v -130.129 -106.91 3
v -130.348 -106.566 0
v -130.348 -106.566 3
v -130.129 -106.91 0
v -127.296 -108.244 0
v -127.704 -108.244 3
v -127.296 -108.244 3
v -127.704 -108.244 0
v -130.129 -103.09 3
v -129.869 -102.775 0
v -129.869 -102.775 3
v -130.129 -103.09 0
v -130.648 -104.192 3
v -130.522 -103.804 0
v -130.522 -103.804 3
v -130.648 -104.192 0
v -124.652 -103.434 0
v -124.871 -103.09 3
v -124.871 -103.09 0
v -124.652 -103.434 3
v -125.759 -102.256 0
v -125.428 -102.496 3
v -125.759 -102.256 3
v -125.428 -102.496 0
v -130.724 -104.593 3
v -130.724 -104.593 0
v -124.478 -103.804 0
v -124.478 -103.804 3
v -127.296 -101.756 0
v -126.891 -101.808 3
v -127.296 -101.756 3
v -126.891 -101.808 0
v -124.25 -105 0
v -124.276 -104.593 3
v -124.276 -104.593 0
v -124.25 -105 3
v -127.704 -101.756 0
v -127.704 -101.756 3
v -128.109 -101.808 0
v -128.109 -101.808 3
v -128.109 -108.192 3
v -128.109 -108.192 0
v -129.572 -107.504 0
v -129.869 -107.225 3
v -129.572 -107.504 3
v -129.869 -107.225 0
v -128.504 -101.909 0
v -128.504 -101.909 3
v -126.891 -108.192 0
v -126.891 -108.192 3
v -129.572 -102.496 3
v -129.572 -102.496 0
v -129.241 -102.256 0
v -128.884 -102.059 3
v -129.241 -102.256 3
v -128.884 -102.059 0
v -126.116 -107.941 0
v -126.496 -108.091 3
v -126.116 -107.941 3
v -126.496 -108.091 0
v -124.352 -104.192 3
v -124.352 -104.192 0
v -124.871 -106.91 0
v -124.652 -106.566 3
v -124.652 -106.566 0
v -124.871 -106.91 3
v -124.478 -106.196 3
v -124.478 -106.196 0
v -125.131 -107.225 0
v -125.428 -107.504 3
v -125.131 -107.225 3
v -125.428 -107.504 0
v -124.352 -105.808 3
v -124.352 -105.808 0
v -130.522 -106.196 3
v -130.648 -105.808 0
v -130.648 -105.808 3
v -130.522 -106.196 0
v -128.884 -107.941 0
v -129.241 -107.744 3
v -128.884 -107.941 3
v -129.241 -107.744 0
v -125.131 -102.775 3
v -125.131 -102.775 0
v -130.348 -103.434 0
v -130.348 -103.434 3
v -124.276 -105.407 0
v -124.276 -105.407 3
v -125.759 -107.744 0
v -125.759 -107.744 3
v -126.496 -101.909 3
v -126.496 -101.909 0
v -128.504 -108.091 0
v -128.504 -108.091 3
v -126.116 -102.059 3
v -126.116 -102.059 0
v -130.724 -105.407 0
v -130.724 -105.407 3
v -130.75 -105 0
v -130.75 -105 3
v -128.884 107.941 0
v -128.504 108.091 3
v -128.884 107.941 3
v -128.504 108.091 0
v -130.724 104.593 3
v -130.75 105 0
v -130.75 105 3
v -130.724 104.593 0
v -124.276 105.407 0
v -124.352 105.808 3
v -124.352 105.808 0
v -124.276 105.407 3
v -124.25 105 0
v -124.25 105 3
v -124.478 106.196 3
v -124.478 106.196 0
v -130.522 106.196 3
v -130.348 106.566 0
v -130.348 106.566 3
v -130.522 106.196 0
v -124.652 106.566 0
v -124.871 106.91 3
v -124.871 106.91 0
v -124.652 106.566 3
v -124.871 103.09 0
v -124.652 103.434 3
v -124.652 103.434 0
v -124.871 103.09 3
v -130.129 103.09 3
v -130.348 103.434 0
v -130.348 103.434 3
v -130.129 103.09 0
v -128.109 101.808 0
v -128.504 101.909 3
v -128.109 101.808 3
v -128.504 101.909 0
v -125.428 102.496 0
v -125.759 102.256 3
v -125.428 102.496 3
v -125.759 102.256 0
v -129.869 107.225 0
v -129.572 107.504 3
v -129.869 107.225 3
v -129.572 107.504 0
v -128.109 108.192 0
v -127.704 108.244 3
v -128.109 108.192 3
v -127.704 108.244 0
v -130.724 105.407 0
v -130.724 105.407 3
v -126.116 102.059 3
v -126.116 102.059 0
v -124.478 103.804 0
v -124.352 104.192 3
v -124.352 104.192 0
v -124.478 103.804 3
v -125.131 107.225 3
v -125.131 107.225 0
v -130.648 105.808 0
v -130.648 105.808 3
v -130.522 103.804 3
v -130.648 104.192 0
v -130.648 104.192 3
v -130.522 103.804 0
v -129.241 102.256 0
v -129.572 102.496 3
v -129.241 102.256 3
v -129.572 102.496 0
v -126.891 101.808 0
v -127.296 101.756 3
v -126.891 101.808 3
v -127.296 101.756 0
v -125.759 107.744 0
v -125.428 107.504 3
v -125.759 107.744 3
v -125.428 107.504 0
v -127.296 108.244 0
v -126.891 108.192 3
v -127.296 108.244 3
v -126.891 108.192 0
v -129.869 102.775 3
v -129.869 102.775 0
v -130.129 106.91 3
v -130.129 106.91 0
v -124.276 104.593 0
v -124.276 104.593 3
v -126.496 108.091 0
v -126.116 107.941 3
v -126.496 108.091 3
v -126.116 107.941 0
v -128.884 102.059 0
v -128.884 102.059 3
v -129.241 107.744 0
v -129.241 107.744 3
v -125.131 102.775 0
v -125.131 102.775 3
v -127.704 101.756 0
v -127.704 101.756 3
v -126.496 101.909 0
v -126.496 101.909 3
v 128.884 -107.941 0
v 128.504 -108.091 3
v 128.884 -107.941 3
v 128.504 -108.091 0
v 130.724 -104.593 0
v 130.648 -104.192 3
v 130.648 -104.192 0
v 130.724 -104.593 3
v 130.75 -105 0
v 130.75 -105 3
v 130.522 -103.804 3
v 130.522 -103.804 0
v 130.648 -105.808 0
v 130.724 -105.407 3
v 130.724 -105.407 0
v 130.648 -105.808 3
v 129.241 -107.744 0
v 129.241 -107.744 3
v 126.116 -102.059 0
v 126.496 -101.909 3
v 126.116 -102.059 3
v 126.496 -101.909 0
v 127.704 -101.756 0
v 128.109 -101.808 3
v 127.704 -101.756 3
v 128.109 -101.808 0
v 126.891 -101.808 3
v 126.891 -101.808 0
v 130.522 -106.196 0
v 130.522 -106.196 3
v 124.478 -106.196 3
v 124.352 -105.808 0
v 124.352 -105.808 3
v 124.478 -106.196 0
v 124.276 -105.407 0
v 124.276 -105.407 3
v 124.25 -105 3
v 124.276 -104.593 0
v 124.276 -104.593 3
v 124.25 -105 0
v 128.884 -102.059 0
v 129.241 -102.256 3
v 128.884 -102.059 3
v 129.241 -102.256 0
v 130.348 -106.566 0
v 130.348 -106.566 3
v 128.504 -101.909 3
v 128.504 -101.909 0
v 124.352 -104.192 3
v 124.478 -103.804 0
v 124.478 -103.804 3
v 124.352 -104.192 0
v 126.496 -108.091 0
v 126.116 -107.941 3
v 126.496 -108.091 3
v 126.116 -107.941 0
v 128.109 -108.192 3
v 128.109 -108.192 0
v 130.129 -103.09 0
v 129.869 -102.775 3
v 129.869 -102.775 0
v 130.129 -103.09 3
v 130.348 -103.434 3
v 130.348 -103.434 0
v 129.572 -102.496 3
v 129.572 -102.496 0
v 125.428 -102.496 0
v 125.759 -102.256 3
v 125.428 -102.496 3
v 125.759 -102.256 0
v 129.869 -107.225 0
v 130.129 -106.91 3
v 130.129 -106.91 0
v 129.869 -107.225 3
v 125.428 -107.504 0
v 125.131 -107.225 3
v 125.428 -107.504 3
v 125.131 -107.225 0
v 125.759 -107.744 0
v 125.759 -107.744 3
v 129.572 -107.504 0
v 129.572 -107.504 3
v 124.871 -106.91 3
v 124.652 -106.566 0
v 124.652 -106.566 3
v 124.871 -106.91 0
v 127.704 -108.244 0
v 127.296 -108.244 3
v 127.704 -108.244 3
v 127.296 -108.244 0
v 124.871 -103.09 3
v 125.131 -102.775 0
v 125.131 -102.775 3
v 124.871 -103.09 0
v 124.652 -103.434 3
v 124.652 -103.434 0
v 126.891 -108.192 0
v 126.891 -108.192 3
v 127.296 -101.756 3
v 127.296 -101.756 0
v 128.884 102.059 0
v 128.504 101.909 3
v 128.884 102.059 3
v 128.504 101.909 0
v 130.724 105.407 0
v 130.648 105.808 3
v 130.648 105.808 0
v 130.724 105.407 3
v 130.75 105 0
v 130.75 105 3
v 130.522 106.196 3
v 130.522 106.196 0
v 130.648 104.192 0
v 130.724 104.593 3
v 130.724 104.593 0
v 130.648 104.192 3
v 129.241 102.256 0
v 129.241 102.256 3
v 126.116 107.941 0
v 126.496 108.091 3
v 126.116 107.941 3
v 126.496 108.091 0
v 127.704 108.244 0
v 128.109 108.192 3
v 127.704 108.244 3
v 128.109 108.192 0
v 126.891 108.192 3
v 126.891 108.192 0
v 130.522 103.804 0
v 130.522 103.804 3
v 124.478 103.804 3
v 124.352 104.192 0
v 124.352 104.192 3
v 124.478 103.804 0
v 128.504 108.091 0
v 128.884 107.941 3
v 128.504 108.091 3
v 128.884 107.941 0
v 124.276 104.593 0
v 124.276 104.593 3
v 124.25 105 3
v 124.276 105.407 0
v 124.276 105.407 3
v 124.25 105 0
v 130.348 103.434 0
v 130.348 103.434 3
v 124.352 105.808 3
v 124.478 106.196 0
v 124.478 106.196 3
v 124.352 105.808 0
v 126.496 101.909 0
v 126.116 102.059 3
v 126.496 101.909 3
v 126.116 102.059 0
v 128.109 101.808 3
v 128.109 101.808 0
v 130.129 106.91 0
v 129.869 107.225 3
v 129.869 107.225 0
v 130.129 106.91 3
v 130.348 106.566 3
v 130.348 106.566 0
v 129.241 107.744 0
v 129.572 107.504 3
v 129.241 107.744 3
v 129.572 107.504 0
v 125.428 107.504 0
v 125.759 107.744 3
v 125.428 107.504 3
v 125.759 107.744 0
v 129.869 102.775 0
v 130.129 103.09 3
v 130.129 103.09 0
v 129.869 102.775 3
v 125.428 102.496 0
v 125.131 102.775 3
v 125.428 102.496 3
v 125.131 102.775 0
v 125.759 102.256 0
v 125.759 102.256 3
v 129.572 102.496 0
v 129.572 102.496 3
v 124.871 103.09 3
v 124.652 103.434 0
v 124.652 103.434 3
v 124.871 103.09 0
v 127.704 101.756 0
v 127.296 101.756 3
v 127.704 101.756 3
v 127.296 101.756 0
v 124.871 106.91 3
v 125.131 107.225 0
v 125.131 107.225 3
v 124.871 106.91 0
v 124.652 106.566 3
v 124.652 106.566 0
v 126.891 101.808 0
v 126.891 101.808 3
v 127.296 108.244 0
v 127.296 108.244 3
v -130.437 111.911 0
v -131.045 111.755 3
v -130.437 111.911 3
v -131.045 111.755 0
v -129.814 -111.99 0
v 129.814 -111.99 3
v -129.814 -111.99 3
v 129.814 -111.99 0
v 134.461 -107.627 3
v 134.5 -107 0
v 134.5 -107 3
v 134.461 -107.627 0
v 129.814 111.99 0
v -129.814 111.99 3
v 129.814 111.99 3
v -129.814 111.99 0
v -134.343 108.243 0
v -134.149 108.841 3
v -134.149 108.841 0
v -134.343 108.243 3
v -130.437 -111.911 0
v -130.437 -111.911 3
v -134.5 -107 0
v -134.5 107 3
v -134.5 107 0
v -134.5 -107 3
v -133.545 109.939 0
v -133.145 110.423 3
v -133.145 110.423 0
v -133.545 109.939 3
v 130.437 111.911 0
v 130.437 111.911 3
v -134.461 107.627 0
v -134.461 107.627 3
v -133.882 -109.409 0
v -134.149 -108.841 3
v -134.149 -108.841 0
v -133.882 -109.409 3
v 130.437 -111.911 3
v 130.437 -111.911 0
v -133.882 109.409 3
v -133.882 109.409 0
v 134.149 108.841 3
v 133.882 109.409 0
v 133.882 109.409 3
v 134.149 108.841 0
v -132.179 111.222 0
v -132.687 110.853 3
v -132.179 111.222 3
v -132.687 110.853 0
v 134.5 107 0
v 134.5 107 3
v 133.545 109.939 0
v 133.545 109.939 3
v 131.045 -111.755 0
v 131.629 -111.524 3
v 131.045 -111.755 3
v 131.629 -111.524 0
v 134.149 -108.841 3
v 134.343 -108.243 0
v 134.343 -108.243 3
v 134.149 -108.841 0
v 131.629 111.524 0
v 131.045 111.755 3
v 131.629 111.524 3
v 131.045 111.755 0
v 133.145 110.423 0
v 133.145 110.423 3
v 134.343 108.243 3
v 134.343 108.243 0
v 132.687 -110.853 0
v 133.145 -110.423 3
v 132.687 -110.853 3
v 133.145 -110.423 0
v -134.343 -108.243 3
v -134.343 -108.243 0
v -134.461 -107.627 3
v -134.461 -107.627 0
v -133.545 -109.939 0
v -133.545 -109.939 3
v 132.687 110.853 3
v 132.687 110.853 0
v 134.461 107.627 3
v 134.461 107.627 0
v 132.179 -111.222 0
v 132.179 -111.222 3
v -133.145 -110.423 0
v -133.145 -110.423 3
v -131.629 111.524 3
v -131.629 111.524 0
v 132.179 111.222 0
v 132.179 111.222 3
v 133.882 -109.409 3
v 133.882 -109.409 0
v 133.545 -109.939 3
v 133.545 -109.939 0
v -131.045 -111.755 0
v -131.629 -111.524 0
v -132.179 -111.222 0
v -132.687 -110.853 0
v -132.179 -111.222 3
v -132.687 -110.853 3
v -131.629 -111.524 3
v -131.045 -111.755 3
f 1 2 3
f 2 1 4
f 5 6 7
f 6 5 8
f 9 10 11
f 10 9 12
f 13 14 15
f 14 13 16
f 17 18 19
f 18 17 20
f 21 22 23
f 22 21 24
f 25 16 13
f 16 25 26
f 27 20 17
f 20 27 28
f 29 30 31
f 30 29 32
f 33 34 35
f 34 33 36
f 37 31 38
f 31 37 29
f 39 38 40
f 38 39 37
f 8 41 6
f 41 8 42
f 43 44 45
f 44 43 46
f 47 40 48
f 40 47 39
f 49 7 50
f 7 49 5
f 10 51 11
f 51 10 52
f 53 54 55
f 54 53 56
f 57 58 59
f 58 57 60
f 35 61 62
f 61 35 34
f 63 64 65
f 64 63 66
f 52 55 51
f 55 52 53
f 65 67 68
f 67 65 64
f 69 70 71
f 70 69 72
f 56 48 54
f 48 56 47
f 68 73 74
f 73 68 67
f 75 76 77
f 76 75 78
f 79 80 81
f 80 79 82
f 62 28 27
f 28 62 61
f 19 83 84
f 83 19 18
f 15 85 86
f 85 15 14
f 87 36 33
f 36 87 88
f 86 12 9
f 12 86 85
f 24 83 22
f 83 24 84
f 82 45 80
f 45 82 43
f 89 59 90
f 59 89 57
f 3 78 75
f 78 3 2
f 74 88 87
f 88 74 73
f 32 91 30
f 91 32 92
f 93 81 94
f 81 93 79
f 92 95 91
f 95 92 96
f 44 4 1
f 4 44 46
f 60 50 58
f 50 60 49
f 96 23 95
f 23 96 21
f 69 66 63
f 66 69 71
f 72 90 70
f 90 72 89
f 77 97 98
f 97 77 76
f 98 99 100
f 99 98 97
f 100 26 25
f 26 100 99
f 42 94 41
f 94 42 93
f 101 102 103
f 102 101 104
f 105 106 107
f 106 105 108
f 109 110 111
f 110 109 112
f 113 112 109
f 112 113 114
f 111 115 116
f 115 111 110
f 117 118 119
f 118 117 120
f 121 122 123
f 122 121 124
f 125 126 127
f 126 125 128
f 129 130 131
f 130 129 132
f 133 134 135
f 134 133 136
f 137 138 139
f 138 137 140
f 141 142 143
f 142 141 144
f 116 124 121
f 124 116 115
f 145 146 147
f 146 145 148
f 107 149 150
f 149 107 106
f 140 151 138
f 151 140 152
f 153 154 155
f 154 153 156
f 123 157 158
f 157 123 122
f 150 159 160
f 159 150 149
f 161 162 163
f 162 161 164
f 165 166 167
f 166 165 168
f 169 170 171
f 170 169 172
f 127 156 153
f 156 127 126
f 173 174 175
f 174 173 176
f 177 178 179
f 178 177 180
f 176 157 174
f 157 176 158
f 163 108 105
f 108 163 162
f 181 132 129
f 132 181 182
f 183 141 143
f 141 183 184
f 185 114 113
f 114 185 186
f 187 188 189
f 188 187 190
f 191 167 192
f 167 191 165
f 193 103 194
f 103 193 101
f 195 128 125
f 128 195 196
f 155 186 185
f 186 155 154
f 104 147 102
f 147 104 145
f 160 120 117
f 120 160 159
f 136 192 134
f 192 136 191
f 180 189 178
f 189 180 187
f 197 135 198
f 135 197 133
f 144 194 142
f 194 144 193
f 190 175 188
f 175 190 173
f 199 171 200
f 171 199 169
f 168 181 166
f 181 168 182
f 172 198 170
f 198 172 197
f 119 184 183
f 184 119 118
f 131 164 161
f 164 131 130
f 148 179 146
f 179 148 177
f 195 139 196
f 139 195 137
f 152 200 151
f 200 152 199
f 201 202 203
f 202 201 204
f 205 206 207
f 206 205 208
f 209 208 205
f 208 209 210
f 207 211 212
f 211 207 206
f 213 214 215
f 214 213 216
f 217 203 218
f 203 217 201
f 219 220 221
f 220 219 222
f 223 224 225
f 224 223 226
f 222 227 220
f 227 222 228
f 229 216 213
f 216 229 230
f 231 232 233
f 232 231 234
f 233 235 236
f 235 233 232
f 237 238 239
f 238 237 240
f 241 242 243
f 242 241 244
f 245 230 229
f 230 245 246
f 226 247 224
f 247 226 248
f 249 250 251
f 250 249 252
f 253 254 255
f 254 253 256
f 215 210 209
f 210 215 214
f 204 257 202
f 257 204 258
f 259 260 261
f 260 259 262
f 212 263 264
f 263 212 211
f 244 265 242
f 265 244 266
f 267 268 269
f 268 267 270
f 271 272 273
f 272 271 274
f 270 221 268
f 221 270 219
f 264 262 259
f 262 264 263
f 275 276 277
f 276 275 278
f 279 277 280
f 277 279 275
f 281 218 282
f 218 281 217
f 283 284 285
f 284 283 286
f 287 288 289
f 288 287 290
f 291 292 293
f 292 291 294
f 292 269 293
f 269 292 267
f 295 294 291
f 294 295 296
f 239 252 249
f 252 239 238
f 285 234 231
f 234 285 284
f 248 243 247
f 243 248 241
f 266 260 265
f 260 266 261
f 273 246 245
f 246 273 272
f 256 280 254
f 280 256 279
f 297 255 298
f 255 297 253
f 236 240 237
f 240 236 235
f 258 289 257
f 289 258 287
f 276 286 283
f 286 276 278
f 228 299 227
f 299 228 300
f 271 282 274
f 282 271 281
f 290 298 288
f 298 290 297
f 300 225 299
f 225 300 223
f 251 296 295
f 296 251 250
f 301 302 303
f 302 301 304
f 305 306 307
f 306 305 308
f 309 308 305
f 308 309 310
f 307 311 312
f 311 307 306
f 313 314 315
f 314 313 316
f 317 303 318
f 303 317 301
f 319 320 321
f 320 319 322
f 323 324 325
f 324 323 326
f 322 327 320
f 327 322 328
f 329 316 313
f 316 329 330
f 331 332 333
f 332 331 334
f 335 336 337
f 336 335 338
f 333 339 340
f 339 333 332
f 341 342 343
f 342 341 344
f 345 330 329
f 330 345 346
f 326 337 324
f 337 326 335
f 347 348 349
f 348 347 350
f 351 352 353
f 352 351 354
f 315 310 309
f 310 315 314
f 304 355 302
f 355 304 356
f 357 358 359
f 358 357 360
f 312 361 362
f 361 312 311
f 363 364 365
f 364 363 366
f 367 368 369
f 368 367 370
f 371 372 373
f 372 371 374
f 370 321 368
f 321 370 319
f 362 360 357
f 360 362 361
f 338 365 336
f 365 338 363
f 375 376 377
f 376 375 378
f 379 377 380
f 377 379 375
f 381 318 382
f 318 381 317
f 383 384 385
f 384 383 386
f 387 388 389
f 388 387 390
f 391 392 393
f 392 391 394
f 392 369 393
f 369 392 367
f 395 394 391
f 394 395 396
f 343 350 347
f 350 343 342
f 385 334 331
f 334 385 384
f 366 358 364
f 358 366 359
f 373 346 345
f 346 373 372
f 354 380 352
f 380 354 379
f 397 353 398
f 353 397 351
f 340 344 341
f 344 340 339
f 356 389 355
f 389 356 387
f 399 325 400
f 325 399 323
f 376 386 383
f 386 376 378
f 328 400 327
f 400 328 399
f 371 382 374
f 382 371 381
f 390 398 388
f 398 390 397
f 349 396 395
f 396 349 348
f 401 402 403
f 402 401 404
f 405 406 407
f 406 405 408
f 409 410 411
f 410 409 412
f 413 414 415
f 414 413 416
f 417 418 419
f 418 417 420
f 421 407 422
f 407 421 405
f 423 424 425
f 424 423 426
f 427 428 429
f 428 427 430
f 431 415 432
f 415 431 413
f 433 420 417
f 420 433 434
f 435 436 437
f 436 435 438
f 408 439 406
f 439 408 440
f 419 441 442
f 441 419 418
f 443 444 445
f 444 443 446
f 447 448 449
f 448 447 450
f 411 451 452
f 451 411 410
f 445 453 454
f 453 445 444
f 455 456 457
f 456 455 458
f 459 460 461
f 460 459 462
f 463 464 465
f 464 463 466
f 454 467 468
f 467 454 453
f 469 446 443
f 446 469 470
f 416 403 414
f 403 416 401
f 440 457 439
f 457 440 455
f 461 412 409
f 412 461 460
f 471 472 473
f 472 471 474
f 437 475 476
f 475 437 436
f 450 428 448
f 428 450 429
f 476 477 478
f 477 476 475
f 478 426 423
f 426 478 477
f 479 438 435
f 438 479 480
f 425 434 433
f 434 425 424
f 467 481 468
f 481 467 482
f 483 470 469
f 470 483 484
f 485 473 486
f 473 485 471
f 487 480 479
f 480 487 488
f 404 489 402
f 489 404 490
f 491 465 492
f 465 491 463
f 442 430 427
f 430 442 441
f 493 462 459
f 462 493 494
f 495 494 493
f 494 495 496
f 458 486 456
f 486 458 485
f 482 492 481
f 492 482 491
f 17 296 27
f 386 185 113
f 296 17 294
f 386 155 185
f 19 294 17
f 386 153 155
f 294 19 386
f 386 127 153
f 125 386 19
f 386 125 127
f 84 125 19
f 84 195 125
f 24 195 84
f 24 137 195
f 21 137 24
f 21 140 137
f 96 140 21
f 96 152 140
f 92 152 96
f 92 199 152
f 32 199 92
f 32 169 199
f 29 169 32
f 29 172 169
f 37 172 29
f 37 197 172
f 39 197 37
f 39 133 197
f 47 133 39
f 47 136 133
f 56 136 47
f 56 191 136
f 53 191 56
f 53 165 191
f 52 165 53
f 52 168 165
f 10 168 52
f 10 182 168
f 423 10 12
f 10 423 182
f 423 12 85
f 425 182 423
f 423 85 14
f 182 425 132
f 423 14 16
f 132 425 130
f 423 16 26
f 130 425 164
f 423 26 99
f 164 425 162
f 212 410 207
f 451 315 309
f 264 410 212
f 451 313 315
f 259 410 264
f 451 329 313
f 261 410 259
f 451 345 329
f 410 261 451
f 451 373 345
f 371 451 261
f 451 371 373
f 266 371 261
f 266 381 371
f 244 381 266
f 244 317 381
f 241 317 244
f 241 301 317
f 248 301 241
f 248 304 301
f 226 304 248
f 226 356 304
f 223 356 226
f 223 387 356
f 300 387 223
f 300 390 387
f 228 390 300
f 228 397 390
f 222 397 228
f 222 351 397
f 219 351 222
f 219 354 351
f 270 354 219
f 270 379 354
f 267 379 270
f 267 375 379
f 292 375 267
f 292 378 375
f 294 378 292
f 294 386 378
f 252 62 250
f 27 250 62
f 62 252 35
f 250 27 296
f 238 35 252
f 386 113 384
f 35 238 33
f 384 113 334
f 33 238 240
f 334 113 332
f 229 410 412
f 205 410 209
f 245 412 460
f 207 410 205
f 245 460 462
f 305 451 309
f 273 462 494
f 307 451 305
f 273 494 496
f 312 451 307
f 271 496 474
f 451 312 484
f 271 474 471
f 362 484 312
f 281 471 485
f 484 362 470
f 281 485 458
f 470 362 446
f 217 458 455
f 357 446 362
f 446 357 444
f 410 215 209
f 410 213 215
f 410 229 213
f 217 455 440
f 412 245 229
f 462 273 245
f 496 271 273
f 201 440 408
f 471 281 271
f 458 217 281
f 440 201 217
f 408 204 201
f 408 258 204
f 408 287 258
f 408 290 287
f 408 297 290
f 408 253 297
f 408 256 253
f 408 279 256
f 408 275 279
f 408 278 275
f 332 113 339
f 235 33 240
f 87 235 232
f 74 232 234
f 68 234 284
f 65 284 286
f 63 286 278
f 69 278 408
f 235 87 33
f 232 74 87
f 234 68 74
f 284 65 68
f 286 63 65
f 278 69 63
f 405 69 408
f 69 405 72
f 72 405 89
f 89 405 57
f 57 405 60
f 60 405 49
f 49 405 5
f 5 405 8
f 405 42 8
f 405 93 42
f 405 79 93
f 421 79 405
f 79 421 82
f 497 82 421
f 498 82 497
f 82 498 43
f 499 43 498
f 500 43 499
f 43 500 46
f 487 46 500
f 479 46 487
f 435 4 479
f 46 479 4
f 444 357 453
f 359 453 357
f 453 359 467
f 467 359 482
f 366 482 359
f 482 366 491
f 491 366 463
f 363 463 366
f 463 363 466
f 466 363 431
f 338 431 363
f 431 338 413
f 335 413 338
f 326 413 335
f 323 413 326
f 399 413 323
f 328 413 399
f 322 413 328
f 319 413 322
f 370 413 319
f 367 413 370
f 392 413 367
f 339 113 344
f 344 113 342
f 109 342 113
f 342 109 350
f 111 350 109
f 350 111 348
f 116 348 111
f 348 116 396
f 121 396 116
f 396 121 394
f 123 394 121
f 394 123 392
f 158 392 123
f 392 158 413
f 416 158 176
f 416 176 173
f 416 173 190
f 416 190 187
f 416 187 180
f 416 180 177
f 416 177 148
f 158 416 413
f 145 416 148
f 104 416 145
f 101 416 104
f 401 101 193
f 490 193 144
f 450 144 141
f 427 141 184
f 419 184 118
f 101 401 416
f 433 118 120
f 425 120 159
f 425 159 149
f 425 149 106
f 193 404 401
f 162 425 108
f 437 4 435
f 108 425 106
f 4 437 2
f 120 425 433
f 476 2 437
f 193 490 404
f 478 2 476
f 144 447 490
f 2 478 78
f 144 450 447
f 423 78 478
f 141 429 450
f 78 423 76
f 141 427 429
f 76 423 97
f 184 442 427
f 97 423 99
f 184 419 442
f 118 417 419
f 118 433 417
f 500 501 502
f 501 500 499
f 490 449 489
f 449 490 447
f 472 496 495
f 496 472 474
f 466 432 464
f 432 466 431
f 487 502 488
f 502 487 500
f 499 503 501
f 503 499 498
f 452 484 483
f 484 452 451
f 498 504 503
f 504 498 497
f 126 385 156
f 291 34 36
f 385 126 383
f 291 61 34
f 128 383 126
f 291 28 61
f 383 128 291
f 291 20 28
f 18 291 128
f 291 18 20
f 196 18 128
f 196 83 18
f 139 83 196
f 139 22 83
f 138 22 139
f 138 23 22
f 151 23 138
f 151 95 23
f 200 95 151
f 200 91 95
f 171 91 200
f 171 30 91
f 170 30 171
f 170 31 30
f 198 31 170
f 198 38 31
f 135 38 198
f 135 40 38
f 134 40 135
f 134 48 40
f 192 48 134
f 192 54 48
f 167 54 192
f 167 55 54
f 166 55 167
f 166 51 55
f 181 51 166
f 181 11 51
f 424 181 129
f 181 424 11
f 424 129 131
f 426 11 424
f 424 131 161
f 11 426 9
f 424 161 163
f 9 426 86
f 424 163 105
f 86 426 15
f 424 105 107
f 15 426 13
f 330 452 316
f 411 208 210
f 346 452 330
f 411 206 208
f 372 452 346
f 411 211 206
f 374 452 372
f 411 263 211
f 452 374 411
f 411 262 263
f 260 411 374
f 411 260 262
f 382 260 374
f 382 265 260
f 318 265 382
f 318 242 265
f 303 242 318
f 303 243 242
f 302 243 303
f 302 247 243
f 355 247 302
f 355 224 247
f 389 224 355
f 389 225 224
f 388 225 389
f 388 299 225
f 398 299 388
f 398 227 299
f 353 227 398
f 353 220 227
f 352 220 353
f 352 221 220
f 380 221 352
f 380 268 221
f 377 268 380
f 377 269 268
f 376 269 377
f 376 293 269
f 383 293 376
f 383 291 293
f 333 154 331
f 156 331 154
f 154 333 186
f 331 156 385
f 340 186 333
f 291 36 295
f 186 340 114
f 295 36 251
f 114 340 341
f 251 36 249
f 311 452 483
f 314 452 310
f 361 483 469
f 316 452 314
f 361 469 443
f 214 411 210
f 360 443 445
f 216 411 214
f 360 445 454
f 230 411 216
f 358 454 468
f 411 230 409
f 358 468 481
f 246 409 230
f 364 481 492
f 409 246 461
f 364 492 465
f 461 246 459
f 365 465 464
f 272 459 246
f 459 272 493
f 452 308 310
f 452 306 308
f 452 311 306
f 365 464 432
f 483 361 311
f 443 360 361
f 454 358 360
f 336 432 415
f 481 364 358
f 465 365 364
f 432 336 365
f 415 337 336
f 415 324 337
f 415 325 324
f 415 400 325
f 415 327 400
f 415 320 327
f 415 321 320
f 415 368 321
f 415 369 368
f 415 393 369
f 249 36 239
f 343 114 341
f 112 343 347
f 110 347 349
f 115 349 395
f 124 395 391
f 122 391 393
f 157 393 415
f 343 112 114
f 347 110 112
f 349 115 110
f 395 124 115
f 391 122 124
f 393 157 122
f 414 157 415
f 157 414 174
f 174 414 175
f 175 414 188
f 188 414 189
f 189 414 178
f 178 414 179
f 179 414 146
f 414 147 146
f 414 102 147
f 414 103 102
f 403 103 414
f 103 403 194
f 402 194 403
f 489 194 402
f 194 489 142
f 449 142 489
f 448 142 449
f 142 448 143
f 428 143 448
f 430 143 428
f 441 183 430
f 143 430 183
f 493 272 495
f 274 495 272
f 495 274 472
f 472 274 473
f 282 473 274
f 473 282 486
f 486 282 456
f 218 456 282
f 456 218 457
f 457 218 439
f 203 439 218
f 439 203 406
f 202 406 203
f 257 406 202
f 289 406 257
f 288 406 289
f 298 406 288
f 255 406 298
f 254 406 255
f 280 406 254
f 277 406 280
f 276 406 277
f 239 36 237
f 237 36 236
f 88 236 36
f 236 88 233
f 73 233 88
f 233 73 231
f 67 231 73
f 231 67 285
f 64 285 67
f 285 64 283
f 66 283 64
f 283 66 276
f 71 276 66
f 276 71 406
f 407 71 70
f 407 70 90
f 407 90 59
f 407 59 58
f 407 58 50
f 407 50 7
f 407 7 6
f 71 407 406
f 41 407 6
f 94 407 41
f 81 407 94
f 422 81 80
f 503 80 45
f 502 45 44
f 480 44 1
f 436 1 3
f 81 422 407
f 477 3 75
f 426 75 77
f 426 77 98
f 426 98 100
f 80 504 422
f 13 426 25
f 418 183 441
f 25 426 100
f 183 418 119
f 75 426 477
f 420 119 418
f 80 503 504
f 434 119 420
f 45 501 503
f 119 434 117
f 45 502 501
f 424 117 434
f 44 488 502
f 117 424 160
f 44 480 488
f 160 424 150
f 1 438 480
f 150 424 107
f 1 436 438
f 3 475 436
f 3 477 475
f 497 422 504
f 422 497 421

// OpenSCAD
$fn = 50;


difference() {
	union() {
		hull() {
			translate(v = [-129.5000000000, 107.0000000000, 0]) {
				cylinder(h = 3, r = 5);
			}
			translate(v = [129.5000000000, 107.0000000000, 0]) {
				cylinder(h = 3, r = 5);
			}
			translate(v = [-129.5000000000, -107.0000000000, 0]) {
				cylinder(h = 3, r = 5);
			}
			translate(v = [129.5000000000, -107.0000000000, 0]) {
				cylinder(h = 3, r = 5);
			}
		}
	}
	union() {
		translate(v = [-127.5000000000, -105.0000000000, -100.0000000000]) {
			cylinder(h = 200, r = 3.2500000000);
		}
		translate(v = [-127.5000000000, 105.0000000000, -100.0000000000]) {
			cylinder(h = 200, r = 3.2500000000);
		}
		translate(v = [127.5000000000, -105.0000000000, -100.0000000000]) {
			cylinder(h = 200, r = 3.2500000000);
		}
		translate(v = [127.5000000000, 105.0000000000, -100.0000000000]) {
			cylinder(h = 200, r = 3.2500000000);
		}
	}
}
